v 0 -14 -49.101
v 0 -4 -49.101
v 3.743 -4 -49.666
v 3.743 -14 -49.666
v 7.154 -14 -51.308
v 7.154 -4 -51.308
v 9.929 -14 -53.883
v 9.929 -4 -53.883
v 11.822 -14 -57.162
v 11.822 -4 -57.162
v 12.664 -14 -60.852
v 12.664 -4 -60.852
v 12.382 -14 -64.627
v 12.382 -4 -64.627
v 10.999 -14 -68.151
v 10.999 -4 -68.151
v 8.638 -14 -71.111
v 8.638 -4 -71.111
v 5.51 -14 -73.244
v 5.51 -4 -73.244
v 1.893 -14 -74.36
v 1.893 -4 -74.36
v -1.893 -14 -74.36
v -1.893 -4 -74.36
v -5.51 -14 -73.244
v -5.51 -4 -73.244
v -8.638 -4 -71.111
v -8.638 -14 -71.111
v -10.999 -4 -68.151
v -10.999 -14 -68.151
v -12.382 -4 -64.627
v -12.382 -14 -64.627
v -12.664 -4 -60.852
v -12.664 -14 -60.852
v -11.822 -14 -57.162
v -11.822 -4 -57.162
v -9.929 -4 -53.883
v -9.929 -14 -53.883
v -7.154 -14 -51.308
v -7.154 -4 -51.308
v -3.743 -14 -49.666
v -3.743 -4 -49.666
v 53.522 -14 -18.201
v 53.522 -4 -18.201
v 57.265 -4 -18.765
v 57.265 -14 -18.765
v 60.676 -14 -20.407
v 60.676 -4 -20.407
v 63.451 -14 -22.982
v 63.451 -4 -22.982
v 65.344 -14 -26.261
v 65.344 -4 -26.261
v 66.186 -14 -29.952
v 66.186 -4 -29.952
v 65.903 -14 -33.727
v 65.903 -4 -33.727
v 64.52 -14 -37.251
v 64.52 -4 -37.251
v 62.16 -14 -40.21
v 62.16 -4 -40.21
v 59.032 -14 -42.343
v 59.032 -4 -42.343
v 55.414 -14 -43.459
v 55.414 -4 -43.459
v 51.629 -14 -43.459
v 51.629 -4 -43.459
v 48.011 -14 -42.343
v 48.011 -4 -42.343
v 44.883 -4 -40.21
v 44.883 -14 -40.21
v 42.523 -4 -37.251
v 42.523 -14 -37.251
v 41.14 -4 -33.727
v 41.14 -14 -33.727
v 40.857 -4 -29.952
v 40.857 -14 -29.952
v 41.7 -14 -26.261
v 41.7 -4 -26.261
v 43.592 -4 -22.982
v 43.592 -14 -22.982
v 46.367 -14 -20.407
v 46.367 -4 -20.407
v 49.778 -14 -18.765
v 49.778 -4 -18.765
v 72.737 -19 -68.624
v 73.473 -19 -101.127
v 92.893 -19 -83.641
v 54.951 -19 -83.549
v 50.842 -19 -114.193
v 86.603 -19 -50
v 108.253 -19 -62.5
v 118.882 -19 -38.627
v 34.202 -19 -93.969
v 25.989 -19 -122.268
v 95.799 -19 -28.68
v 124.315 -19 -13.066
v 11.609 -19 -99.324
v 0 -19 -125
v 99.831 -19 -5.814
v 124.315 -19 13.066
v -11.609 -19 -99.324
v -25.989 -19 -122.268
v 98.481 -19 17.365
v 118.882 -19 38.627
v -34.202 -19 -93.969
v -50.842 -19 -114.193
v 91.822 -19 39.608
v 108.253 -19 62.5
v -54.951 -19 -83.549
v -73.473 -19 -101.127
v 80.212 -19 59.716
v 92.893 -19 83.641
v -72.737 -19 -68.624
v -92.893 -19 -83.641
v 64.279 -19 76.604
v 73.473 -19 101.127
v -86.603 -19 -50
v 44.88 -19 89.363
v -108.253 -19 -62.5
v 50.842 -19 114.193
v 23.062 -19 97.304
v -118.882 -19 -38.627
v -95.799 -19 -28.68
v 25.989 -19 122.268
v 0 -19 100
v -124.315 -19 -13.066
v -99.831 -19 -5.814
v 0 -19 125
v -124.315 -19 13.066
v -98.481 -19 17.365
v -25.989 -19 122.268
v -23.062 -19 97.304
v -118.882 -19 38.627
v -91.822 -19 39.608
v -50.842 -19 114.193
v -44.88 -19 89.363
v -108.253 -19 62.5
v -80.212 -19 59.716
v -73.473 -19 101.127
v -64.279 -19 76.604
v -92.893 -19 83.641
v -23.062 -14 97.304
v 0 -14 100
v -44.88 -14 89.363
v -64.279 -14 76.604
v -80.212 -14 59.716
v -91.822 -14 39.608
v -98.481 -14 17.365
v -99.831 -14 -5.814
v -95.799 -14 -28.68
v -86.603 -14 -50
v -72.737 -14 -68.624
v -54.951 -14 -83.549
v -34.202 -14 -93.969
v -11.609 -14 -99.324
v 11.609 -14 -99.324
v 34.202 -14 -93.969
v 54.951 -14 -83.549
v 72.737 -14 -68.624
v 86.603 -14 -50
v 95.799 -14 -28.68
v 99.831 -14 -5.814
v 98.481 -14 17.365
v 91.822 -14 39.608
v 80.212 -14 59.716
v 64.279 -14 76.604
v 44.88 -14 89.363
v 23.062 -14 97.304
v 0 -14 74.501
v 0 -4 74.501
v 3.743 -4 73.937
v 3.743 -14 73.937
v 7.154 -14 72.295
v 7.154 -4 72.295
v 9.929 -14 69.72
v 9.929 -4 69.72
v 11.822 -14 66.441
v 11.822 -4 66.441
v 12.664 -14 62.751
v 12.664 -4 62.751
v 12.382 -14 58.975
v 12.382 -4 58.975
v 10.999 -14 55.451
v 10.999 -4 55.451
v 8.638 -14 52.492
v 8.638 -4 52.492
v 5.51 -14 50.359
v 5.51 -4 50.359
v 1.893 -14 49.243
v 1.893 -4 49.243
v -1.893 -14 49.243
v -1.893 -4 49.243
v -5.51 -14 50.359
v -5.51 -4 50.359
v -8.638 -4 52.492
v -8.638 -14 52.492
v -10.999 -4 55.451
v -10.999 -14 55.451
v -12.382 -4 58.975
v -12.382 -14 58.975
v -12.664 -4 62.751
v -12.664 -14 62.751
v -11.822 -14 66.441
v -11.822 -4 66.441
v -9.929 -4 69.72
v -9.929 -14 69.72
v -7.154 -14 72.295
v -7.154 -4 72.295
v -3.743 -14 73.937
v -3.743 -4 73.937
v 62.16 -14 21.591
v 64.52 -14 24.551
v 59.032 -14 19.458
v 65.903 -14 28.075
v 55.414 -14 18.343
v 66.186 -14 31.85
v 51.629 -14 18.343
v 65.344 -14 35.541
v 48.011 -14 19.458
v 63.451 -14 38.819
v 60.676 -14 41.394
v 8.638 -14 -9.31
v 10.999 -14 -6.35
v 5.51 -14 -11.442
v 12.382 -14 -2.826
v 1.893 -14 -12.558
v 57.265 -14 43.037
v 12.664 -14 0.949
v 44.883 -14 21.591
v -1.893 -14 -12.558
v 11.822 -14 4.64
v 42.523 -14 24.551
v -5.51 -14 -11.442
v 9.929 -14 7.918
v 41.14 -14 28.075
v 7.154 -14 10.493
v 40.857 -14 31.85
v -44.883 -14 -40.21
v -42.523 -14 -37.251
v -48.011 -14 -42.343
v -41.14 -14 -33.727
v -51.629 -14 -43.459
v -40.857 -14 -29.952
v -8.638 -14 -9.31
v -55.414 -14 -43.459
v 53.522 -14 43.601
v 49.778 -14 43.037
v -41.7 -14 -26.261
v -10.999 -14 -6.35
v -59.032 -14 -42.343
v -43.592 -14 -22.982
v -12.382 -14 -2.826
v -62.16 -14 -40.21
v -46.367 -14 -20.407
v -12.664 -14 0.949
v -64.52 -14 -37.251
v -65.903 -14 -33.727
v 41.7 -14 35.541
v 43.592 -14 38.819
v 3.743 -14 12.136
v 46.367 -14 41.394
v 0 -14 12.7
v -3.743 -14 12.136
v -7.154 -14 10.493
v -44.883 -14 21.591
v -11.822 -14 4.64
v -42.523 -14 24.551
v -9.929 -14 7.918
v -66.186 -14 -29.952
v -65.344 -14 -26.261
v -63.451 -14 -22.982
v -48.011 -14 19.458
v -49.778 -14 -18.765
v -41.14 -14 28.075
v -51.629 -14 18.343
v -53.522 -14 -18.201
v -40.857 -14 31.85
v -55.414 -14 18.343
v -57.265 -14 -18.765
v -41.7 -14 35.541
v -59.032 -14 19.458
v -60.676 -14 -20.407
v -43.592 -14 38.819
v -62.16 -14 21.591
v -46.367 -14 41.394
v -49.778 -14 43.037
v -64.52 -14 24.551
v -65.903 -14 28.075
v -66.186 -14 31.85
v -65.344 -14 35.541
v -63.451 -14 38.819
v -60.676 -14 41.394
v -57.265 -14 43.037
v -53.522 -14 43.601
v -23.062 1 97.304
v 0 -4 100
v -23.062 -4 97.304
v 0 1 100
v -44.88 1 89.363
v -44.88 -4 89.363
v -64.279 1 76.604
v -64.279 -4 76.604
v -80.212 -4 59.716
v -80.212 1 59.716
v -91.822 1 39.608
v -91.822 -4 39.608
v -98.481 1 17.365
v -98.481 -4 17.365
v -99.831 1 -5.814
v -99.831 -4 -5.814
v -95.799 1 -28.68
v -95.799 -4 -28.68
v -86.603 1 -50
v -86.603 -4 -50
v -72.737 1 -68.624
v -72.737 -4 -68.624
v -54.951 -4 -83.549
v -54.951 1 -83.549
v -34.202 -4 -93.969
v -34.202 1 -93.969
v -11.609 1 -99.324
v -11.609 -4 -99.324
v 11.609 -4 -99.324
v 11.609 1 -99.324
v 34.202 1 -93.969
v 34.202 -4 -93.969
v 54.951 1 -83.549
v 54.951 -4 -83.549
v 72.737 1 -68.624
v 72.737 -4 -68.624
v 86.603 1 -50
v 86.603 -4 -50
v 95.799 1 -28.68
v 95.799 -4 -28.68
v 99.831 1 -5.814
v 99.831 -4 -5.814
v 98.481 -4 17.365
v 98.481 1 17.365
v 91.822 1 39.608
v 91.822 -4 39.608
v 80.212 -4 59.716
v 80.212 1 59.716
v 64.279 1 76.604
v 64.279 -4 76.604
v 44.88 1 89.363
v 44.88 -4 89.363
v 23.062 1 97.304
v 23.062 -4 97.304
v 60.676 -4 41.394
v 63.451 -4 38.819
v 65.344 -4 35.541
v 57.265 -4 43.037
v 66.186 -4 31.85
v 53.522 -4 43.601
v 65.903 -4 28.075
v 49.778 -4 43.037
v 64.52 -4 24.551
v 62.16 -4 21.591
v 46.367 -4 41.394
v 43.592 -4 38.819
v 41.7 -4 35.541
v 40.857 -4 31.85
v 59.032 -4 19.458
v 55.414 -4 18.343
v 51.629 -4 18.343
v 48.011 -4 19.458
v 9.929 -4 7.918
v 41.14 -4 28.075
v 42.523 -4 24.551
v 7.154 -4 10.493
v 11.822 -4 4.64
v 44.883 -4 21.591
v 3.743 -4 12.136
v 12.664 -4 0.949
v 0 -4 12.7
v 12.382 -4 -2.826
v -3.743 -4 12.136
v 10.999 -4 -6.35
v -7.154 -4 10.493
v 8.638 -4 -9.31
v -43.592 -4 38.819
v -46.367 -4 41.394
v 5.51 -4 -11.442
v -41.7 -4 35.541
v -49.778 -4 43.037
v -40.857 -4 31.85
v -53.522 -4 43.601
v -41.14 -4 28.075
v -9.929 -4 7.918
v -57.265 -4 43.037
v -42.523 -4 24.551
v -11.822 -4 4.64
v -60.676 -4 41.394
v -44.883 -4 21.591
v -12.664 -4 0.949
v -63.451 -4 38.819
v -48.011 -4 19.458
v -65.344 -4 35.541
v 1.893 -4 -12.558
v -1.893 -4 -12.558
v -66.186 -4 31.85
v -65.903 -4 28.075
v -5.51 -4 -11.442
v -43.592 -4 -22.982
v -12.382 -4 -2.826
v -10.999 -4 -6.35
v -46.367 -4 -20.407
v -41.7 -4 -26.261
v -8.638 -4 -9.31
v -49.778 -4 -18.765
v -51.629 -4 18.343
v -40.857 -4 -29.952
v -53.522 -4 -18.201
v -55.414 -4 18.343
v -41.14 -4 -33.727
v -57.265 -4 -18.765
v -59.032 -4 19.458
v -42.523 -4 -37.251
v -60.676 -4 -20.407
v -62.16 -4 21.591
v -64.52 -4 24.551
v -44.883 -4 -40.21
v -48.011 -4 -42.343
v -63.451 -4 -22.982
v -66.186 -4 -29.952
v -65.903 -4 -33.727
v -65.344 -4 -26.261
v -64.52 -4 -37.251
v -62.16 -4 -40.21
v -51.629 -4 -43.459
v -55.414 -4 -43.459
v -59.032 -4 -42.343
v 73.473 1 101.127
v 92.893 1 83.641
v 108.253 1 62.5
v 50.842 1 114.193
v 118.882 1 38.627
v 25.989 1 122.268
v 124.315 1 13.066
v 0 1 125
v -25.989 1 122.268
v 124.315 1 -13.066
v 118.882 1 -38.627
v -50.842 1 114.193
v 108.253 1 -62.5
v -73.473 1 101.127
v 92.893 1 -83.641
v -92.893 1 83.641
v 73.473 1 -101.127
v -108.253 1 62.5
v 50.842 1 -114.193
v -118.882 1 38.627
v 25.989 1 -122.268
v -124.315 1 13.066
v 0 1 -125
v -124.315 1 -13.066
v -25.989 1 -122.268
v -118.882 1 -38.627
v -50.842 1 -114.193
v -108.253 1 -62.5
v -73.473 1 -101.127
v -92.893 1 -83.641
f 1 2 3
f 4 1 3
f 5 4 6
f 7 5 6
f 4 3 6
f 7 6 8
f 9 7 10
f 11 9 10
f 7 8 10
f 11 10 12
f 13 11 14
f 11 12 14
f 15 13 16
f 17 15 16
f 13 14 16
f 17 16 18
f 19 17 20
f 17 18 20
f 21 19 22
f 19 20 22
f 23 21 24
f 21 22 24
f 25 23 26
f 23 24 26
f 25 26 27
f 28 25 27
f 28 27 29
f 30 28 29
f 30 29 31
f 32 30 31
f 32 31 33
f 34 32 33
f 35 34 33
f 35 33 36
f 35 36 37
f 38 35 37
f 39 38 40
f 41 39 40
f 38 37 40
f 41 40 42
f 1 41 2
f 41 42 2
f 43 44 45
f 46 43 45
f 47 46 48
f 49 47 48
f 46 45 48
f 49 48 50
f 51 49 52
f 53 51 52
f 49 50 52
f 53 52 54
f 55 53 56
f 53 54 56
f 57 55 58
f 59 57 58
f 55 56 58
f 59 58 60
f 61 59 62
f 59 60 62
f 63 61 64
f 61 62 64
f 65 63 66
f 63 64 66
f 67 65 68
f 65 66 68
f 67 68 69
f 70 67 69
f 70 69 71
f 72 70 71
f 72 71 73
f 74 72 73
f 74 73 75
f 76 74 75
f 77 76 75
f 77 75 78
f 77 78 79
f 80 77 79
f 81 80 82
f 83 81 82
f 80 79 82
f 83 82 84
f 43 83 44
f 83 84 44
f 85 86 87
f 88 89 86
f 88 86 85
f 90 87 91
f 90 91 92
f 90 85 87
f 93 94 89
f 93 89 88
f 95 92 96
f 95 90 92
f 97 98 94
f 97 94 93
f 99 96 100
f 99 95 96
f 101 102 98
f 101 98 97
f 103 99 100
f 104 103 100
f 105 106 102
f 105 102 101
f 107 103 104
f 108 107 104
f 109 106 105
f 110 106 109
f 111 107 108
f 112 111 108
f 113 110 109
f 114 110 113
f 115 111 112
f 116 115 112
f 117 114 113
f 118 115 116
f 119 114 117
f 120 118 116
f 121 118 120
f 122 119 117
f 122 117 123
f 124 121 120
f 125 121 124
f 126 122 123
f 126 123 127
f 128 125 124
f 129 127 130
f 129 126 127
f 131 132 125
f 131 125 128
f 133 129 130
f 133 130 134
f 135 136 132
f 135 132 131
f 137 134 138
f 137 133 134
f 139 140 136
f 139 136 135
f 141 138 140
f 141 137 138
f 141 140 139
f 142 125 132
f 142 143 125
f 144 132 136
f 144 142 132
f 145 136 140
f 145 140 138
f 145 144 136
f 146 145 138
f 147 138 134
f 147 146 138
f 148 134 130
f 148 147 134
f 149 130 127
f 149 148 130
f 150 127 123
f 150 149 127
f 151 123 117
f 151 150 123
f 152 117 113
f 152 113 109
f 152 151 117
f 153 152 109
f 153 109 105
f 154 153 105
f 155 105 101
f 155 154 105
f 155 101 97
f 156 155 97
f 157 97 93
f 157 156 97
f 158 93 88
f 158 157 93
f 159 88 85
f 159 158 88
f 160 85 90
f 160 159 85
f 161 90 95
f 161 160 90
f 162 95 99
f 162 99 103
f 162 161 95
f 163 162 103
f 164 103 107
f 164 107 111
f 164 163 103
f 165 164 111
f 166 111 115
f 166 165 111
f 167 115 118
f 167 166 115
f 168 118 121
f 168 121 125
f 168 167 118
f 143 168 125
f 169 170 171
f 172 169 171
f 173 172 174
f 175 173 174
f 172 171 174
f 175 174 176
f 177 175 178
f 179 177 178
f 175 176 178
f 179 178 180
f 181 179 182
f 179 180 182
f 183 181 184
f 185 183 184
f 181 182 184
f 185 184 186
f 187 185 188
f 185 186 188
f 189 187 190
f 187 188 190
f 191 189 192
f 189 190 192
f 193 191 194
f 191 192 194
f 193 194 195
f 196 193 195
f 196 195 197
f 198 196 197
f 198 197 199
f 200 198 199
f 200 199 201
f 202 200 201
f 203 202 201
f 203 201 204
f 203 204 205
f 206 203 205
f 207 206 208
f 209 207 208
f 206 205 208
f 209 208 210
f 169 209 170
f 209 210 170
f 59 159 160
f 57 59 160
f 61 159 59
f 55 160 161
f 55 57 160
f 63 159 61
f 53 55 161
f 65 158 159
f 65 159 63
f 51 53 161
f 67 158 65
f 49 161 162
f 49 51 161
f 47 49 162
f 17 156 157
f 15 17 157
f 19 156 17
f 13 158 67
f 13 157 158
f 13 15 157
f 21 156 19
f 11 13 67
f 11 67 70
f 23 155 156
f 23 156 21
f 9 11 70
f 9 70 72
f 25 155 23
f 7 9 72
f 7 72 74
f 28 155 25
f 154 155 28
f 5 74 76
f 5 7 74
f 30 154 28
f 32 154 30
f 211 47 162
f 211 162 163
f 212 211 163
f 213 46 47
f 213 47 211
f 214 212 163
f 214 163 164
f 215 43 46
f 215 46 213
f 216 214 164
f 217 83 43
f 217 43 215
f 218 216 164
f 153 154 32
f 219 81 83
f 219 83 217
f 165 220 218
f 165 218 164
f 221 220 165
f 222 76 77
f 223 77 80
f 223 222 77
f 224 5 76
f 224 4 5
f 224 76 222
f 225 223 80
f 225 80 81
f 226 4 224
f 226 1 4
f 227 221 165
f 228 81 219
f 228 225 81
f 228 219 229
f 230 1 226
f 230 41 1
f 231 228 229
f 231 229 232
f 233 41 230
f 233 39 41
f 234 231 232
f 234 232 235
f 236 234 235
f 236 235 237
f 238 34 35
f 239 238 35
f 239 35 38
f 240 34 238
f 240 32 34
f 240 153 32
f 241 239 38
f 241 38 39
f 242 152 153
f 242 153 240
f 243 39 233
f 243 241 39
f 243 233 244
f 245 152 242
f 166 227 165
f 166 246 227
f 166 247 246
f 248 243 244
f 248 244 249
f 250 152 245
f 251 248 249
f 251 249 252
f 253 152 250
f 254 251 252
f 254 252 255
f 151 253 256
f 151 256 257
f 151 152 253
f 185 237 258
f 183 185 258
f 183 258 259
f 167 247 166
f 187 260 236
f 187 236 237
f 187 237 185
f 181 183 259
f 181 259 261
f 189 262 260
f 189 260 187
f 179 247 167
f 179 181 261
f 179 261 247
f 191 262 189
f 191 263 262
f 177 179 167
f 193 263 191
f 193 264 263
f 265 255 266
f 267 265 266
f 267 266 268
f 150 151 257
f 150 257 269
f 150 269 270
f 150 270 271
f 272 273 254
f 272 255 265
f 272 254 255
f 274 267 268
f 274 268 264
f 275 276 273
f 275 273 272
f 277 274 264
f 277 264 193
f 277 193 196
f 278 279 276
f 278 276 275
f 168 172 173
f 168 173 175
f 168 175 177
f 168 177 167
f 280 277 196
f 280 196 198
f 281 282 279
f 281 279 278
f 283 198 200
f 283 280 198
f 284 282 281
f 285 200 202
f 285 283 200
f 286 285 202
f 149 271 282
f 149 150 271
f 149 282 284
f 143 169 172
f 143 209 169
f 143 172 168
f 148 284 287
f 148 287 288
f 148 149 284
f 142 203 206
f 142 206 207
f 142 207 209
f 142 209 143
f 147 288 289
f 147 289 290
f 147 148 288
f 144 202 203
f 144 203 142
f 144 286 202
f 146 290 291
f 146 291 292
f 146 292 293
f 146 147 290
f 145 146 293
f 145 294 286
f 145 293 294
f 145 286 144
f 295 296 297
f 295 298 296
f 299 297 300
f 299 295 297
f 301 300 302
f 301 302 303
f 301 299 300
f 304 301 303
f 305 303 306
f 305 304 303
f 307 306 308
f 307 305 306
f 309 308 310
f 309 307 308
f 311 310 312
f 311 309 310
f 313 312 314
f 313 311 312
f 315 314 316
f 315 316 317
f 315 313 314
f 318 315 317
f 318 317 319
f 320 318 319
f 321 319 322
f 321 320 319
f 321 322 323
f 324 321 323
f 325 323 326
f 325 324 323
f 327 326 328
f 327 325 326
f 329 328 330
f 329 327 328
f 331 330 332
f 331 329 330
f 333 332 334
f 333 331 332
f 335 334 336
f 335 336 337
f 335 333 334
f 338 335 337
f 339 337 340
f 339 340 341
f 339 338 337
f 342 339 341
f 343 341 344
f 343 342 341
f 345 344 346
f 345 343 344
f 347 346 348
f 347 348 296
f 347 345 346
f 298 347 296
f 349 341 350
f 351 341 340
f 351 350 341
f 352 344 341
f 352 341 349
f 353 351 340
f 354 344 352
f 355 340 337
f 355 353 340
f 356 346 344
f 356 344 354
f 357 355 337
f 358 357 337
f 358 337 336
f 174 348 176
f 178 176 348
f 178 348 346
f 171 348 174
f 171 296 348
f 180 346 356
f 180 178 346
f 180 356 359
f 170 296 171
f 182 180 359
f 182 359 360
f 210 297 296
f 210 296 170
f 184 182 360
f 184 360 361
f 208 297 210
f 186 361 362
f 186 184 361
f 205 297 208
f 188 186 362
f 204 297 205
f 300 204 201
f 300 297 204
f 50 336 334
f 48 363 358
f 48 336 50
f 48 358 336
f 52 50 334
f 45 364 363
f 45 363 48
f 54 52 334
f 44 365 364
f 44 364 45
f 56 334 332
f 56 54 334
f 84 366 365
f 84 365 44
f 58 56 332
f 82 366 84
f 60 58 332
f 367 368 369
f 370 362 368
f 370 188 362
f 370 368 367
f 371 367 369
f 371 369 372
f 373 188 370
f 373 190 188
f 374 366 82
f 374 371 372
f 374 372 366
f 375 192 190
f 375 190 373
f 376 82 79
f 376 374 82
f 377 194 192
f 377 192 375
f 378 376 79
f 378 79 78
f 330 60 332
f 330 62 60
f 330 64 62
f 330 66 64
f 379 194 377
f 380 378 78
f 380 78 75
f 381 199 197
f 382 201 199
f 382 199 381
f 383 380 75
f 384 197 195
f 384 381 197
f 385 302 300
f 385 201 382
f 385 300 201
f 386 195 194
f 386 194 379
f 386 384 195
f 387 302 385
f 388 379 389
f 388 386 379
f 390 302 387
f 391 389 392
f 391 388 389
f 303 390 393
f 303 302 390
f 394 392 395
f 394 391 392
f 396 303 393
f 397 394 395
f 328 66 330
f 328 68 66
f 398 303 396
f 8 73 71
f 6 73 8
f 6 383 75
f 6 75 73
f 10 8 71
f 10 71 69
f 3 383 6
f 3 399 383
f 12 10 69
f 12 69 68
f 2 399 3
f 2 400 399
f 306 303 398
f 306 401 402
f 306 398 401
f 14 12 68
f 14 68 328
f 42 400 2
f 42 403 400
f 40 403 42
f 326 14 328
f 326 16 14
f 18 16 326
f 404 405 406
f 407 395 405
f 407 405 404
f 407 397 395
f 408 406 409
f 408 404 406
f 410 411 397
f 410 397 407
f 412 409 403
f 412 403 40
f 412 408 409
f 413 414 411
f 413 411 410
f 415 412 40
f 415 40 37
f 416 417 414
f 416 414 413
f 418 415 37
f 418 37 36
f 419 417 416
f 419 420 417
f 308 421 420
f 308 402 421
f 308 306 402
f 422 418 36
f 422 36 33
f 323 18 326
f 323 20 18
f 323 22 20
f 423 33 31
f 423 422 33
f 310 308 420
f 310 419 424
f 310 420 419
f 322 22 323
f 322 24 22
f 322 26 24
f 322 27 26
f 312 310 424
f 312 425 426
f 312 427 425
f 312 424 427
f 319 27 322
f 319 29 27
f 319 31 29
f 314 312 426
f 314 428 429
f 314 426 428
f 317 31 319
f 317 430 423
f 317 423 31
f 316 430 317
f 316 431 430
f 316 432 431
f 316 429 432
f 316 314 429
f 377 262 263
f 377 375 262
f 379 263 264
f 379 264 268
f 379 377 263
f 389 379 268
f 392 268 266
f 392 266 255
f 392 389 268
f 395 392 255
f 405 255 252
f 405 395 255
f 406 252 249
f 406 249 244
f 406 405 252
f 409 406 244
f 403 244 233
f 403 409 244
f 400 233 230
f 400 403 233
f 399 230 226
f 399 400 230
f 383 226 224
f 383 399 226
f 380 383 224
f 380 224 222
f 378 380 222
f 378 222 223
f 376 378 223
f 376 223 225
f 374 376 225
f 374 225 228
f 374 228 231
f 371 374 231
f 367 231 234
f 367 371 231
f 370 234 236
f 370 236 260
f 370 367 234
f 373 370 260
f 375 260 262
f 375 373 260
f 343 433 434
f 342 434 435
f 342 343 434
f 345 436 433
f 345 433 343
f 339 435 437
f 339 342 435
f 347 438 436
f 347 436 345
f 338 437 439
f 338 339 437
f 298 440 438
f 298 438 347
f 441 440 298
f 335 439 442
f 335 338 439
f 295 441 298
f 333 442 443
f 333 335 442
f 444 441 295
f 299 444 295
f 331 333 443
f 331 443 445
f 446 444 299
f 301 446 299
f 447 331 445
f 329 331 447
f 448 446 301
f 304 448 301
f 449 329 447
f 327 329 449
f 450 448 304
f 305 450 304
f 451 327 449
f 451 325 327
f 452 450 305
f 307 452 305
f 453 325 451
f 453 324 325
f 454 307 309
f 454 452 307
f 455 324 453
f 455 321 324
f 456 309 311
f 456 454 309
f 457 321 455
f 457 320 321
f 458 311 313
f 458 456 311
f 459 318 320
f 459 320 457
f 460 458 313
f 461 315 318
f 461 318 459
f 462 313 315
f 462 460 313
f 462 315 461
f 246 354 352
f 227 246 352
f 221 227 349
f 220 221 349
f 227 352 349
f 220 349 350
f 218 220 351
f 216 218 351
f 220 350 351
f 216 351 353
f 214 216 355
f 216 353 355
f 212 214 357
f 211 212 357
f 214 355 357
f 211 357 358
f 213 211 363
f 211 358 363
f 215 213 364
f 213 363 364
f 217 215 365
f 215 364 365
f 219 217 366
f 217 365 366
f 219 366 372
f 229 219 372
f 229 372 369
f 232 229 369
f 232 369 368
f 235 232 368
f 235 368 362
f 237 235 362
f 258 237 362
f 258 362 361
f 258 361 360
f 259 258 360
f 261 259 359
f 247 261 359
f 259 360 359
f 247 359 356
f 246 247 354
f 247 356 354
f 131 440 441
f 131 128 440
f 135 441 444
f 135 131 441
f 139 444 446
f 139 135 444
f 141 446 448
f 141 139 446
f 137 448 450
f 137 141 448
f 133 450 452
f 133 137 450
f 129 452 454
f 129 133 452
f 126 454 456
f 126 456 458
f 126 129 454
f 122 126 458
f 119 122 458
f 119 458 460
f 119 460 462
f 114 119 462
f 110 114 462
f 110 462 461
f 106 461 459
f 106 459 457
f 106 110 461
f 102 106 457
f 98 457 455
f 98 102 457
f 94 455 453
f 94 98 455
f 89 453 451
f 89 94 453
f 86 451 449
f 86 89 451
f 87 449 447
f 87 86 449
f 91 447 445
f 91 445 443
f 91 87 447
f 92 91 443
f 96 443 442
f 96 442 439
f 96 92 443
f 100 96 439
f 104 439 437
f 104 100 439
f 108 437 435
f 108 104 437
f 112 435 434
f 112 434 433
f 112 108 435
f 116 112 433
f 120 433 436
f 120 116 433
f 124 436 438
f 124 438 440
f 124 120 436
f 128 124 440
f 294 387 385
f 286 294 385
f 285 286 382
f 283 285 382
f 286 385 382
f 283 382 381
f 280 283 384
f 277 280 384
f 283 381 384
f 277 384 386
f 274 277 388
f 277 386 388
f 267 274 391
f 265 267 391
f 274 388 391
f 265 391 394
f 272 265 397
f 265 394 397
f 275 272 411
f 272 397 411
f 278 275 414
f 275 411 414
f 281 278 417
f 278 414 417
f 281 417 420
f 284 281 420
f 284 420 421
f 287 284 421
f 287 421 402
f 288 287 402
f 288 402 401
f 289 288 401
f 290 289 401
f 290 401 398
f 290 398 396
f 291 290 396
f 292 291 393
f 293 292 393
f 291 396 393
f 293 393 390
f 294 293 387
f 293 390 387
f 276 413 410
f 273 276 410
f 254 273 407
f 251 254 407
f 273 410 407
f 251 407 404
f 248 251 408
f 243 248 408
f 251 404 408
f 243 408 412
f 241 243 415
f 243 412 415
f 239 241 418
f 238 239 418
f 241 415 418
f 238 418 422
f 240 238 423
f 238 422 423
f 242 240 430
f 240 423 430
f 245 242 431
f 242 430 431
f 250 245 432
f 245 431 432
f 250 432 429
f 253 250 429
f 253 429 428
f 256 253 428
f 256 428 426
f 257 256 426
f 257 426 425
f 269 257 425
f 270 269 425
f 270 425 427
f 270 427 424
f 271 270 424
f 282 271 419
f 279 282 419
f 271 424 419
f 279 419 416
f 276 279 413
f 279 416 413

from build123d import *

# Parameters (mm, degrees)
SKETCH2_R          = 12.7
CUT_EXTRUDE1_DEPTH = 10


with BuildPart() as part:
    # Sketch1 → Revolve1 (revolve)
    with BuildSketch(Plane.XY, mode=Mode.PRIVATE) as revolve1_sk:
        Polygon((12.7, -4), (100, -4), (100, 1), (125, 1), (125, -19), (100, -19), (100, -14), (12.7, -14), align=None)
    revolve(revolve1_sk.sketch.rotate(Axis((0, 113.049804917, 0), (0, -1, 0)), 90), axis=Axis((0, 113.049804917, 0), (0, -1, 0)))

    # Sketch2 → Cut-Extrude1 (cut)
    with BuildSketch(Plane(origin=(0, -4, 0), x_dir=(1, 0, 0), z_dir=(0, 1, 0))):
        with Locations(Location((0, 61.801458798, 0), (0, 0, 270))):
            Circle(SKETCH2_R)
        with Locations(Location((53.52163331, 30.900729399, 0), (0, 0, 270))):
            Circle(SKETCH2_R)
        with Locations(Location((53.52163331, -30.900729399, 0), (0, 0, 270))):
            Circle(SKETCH2_R)
        with Locations(Location((0, -61.801458798, 0), (0, 0, 270))):
            Circle(SKETCH2_R)
        with Locations(Location((-53.52163331, -30.900729399, 0), (0, 0, 270))):
            Circle(SKETCH2_R)
        with Locations(Location((-53.52163331, 30.900729399, 0), (0, 0, 270))):
            Circle(SKETCH2_R)
    extrude(amount=-CUT_EXTRUDE1_DEPTH, mode=Mode.SUBTRACT)


solid = part.part
